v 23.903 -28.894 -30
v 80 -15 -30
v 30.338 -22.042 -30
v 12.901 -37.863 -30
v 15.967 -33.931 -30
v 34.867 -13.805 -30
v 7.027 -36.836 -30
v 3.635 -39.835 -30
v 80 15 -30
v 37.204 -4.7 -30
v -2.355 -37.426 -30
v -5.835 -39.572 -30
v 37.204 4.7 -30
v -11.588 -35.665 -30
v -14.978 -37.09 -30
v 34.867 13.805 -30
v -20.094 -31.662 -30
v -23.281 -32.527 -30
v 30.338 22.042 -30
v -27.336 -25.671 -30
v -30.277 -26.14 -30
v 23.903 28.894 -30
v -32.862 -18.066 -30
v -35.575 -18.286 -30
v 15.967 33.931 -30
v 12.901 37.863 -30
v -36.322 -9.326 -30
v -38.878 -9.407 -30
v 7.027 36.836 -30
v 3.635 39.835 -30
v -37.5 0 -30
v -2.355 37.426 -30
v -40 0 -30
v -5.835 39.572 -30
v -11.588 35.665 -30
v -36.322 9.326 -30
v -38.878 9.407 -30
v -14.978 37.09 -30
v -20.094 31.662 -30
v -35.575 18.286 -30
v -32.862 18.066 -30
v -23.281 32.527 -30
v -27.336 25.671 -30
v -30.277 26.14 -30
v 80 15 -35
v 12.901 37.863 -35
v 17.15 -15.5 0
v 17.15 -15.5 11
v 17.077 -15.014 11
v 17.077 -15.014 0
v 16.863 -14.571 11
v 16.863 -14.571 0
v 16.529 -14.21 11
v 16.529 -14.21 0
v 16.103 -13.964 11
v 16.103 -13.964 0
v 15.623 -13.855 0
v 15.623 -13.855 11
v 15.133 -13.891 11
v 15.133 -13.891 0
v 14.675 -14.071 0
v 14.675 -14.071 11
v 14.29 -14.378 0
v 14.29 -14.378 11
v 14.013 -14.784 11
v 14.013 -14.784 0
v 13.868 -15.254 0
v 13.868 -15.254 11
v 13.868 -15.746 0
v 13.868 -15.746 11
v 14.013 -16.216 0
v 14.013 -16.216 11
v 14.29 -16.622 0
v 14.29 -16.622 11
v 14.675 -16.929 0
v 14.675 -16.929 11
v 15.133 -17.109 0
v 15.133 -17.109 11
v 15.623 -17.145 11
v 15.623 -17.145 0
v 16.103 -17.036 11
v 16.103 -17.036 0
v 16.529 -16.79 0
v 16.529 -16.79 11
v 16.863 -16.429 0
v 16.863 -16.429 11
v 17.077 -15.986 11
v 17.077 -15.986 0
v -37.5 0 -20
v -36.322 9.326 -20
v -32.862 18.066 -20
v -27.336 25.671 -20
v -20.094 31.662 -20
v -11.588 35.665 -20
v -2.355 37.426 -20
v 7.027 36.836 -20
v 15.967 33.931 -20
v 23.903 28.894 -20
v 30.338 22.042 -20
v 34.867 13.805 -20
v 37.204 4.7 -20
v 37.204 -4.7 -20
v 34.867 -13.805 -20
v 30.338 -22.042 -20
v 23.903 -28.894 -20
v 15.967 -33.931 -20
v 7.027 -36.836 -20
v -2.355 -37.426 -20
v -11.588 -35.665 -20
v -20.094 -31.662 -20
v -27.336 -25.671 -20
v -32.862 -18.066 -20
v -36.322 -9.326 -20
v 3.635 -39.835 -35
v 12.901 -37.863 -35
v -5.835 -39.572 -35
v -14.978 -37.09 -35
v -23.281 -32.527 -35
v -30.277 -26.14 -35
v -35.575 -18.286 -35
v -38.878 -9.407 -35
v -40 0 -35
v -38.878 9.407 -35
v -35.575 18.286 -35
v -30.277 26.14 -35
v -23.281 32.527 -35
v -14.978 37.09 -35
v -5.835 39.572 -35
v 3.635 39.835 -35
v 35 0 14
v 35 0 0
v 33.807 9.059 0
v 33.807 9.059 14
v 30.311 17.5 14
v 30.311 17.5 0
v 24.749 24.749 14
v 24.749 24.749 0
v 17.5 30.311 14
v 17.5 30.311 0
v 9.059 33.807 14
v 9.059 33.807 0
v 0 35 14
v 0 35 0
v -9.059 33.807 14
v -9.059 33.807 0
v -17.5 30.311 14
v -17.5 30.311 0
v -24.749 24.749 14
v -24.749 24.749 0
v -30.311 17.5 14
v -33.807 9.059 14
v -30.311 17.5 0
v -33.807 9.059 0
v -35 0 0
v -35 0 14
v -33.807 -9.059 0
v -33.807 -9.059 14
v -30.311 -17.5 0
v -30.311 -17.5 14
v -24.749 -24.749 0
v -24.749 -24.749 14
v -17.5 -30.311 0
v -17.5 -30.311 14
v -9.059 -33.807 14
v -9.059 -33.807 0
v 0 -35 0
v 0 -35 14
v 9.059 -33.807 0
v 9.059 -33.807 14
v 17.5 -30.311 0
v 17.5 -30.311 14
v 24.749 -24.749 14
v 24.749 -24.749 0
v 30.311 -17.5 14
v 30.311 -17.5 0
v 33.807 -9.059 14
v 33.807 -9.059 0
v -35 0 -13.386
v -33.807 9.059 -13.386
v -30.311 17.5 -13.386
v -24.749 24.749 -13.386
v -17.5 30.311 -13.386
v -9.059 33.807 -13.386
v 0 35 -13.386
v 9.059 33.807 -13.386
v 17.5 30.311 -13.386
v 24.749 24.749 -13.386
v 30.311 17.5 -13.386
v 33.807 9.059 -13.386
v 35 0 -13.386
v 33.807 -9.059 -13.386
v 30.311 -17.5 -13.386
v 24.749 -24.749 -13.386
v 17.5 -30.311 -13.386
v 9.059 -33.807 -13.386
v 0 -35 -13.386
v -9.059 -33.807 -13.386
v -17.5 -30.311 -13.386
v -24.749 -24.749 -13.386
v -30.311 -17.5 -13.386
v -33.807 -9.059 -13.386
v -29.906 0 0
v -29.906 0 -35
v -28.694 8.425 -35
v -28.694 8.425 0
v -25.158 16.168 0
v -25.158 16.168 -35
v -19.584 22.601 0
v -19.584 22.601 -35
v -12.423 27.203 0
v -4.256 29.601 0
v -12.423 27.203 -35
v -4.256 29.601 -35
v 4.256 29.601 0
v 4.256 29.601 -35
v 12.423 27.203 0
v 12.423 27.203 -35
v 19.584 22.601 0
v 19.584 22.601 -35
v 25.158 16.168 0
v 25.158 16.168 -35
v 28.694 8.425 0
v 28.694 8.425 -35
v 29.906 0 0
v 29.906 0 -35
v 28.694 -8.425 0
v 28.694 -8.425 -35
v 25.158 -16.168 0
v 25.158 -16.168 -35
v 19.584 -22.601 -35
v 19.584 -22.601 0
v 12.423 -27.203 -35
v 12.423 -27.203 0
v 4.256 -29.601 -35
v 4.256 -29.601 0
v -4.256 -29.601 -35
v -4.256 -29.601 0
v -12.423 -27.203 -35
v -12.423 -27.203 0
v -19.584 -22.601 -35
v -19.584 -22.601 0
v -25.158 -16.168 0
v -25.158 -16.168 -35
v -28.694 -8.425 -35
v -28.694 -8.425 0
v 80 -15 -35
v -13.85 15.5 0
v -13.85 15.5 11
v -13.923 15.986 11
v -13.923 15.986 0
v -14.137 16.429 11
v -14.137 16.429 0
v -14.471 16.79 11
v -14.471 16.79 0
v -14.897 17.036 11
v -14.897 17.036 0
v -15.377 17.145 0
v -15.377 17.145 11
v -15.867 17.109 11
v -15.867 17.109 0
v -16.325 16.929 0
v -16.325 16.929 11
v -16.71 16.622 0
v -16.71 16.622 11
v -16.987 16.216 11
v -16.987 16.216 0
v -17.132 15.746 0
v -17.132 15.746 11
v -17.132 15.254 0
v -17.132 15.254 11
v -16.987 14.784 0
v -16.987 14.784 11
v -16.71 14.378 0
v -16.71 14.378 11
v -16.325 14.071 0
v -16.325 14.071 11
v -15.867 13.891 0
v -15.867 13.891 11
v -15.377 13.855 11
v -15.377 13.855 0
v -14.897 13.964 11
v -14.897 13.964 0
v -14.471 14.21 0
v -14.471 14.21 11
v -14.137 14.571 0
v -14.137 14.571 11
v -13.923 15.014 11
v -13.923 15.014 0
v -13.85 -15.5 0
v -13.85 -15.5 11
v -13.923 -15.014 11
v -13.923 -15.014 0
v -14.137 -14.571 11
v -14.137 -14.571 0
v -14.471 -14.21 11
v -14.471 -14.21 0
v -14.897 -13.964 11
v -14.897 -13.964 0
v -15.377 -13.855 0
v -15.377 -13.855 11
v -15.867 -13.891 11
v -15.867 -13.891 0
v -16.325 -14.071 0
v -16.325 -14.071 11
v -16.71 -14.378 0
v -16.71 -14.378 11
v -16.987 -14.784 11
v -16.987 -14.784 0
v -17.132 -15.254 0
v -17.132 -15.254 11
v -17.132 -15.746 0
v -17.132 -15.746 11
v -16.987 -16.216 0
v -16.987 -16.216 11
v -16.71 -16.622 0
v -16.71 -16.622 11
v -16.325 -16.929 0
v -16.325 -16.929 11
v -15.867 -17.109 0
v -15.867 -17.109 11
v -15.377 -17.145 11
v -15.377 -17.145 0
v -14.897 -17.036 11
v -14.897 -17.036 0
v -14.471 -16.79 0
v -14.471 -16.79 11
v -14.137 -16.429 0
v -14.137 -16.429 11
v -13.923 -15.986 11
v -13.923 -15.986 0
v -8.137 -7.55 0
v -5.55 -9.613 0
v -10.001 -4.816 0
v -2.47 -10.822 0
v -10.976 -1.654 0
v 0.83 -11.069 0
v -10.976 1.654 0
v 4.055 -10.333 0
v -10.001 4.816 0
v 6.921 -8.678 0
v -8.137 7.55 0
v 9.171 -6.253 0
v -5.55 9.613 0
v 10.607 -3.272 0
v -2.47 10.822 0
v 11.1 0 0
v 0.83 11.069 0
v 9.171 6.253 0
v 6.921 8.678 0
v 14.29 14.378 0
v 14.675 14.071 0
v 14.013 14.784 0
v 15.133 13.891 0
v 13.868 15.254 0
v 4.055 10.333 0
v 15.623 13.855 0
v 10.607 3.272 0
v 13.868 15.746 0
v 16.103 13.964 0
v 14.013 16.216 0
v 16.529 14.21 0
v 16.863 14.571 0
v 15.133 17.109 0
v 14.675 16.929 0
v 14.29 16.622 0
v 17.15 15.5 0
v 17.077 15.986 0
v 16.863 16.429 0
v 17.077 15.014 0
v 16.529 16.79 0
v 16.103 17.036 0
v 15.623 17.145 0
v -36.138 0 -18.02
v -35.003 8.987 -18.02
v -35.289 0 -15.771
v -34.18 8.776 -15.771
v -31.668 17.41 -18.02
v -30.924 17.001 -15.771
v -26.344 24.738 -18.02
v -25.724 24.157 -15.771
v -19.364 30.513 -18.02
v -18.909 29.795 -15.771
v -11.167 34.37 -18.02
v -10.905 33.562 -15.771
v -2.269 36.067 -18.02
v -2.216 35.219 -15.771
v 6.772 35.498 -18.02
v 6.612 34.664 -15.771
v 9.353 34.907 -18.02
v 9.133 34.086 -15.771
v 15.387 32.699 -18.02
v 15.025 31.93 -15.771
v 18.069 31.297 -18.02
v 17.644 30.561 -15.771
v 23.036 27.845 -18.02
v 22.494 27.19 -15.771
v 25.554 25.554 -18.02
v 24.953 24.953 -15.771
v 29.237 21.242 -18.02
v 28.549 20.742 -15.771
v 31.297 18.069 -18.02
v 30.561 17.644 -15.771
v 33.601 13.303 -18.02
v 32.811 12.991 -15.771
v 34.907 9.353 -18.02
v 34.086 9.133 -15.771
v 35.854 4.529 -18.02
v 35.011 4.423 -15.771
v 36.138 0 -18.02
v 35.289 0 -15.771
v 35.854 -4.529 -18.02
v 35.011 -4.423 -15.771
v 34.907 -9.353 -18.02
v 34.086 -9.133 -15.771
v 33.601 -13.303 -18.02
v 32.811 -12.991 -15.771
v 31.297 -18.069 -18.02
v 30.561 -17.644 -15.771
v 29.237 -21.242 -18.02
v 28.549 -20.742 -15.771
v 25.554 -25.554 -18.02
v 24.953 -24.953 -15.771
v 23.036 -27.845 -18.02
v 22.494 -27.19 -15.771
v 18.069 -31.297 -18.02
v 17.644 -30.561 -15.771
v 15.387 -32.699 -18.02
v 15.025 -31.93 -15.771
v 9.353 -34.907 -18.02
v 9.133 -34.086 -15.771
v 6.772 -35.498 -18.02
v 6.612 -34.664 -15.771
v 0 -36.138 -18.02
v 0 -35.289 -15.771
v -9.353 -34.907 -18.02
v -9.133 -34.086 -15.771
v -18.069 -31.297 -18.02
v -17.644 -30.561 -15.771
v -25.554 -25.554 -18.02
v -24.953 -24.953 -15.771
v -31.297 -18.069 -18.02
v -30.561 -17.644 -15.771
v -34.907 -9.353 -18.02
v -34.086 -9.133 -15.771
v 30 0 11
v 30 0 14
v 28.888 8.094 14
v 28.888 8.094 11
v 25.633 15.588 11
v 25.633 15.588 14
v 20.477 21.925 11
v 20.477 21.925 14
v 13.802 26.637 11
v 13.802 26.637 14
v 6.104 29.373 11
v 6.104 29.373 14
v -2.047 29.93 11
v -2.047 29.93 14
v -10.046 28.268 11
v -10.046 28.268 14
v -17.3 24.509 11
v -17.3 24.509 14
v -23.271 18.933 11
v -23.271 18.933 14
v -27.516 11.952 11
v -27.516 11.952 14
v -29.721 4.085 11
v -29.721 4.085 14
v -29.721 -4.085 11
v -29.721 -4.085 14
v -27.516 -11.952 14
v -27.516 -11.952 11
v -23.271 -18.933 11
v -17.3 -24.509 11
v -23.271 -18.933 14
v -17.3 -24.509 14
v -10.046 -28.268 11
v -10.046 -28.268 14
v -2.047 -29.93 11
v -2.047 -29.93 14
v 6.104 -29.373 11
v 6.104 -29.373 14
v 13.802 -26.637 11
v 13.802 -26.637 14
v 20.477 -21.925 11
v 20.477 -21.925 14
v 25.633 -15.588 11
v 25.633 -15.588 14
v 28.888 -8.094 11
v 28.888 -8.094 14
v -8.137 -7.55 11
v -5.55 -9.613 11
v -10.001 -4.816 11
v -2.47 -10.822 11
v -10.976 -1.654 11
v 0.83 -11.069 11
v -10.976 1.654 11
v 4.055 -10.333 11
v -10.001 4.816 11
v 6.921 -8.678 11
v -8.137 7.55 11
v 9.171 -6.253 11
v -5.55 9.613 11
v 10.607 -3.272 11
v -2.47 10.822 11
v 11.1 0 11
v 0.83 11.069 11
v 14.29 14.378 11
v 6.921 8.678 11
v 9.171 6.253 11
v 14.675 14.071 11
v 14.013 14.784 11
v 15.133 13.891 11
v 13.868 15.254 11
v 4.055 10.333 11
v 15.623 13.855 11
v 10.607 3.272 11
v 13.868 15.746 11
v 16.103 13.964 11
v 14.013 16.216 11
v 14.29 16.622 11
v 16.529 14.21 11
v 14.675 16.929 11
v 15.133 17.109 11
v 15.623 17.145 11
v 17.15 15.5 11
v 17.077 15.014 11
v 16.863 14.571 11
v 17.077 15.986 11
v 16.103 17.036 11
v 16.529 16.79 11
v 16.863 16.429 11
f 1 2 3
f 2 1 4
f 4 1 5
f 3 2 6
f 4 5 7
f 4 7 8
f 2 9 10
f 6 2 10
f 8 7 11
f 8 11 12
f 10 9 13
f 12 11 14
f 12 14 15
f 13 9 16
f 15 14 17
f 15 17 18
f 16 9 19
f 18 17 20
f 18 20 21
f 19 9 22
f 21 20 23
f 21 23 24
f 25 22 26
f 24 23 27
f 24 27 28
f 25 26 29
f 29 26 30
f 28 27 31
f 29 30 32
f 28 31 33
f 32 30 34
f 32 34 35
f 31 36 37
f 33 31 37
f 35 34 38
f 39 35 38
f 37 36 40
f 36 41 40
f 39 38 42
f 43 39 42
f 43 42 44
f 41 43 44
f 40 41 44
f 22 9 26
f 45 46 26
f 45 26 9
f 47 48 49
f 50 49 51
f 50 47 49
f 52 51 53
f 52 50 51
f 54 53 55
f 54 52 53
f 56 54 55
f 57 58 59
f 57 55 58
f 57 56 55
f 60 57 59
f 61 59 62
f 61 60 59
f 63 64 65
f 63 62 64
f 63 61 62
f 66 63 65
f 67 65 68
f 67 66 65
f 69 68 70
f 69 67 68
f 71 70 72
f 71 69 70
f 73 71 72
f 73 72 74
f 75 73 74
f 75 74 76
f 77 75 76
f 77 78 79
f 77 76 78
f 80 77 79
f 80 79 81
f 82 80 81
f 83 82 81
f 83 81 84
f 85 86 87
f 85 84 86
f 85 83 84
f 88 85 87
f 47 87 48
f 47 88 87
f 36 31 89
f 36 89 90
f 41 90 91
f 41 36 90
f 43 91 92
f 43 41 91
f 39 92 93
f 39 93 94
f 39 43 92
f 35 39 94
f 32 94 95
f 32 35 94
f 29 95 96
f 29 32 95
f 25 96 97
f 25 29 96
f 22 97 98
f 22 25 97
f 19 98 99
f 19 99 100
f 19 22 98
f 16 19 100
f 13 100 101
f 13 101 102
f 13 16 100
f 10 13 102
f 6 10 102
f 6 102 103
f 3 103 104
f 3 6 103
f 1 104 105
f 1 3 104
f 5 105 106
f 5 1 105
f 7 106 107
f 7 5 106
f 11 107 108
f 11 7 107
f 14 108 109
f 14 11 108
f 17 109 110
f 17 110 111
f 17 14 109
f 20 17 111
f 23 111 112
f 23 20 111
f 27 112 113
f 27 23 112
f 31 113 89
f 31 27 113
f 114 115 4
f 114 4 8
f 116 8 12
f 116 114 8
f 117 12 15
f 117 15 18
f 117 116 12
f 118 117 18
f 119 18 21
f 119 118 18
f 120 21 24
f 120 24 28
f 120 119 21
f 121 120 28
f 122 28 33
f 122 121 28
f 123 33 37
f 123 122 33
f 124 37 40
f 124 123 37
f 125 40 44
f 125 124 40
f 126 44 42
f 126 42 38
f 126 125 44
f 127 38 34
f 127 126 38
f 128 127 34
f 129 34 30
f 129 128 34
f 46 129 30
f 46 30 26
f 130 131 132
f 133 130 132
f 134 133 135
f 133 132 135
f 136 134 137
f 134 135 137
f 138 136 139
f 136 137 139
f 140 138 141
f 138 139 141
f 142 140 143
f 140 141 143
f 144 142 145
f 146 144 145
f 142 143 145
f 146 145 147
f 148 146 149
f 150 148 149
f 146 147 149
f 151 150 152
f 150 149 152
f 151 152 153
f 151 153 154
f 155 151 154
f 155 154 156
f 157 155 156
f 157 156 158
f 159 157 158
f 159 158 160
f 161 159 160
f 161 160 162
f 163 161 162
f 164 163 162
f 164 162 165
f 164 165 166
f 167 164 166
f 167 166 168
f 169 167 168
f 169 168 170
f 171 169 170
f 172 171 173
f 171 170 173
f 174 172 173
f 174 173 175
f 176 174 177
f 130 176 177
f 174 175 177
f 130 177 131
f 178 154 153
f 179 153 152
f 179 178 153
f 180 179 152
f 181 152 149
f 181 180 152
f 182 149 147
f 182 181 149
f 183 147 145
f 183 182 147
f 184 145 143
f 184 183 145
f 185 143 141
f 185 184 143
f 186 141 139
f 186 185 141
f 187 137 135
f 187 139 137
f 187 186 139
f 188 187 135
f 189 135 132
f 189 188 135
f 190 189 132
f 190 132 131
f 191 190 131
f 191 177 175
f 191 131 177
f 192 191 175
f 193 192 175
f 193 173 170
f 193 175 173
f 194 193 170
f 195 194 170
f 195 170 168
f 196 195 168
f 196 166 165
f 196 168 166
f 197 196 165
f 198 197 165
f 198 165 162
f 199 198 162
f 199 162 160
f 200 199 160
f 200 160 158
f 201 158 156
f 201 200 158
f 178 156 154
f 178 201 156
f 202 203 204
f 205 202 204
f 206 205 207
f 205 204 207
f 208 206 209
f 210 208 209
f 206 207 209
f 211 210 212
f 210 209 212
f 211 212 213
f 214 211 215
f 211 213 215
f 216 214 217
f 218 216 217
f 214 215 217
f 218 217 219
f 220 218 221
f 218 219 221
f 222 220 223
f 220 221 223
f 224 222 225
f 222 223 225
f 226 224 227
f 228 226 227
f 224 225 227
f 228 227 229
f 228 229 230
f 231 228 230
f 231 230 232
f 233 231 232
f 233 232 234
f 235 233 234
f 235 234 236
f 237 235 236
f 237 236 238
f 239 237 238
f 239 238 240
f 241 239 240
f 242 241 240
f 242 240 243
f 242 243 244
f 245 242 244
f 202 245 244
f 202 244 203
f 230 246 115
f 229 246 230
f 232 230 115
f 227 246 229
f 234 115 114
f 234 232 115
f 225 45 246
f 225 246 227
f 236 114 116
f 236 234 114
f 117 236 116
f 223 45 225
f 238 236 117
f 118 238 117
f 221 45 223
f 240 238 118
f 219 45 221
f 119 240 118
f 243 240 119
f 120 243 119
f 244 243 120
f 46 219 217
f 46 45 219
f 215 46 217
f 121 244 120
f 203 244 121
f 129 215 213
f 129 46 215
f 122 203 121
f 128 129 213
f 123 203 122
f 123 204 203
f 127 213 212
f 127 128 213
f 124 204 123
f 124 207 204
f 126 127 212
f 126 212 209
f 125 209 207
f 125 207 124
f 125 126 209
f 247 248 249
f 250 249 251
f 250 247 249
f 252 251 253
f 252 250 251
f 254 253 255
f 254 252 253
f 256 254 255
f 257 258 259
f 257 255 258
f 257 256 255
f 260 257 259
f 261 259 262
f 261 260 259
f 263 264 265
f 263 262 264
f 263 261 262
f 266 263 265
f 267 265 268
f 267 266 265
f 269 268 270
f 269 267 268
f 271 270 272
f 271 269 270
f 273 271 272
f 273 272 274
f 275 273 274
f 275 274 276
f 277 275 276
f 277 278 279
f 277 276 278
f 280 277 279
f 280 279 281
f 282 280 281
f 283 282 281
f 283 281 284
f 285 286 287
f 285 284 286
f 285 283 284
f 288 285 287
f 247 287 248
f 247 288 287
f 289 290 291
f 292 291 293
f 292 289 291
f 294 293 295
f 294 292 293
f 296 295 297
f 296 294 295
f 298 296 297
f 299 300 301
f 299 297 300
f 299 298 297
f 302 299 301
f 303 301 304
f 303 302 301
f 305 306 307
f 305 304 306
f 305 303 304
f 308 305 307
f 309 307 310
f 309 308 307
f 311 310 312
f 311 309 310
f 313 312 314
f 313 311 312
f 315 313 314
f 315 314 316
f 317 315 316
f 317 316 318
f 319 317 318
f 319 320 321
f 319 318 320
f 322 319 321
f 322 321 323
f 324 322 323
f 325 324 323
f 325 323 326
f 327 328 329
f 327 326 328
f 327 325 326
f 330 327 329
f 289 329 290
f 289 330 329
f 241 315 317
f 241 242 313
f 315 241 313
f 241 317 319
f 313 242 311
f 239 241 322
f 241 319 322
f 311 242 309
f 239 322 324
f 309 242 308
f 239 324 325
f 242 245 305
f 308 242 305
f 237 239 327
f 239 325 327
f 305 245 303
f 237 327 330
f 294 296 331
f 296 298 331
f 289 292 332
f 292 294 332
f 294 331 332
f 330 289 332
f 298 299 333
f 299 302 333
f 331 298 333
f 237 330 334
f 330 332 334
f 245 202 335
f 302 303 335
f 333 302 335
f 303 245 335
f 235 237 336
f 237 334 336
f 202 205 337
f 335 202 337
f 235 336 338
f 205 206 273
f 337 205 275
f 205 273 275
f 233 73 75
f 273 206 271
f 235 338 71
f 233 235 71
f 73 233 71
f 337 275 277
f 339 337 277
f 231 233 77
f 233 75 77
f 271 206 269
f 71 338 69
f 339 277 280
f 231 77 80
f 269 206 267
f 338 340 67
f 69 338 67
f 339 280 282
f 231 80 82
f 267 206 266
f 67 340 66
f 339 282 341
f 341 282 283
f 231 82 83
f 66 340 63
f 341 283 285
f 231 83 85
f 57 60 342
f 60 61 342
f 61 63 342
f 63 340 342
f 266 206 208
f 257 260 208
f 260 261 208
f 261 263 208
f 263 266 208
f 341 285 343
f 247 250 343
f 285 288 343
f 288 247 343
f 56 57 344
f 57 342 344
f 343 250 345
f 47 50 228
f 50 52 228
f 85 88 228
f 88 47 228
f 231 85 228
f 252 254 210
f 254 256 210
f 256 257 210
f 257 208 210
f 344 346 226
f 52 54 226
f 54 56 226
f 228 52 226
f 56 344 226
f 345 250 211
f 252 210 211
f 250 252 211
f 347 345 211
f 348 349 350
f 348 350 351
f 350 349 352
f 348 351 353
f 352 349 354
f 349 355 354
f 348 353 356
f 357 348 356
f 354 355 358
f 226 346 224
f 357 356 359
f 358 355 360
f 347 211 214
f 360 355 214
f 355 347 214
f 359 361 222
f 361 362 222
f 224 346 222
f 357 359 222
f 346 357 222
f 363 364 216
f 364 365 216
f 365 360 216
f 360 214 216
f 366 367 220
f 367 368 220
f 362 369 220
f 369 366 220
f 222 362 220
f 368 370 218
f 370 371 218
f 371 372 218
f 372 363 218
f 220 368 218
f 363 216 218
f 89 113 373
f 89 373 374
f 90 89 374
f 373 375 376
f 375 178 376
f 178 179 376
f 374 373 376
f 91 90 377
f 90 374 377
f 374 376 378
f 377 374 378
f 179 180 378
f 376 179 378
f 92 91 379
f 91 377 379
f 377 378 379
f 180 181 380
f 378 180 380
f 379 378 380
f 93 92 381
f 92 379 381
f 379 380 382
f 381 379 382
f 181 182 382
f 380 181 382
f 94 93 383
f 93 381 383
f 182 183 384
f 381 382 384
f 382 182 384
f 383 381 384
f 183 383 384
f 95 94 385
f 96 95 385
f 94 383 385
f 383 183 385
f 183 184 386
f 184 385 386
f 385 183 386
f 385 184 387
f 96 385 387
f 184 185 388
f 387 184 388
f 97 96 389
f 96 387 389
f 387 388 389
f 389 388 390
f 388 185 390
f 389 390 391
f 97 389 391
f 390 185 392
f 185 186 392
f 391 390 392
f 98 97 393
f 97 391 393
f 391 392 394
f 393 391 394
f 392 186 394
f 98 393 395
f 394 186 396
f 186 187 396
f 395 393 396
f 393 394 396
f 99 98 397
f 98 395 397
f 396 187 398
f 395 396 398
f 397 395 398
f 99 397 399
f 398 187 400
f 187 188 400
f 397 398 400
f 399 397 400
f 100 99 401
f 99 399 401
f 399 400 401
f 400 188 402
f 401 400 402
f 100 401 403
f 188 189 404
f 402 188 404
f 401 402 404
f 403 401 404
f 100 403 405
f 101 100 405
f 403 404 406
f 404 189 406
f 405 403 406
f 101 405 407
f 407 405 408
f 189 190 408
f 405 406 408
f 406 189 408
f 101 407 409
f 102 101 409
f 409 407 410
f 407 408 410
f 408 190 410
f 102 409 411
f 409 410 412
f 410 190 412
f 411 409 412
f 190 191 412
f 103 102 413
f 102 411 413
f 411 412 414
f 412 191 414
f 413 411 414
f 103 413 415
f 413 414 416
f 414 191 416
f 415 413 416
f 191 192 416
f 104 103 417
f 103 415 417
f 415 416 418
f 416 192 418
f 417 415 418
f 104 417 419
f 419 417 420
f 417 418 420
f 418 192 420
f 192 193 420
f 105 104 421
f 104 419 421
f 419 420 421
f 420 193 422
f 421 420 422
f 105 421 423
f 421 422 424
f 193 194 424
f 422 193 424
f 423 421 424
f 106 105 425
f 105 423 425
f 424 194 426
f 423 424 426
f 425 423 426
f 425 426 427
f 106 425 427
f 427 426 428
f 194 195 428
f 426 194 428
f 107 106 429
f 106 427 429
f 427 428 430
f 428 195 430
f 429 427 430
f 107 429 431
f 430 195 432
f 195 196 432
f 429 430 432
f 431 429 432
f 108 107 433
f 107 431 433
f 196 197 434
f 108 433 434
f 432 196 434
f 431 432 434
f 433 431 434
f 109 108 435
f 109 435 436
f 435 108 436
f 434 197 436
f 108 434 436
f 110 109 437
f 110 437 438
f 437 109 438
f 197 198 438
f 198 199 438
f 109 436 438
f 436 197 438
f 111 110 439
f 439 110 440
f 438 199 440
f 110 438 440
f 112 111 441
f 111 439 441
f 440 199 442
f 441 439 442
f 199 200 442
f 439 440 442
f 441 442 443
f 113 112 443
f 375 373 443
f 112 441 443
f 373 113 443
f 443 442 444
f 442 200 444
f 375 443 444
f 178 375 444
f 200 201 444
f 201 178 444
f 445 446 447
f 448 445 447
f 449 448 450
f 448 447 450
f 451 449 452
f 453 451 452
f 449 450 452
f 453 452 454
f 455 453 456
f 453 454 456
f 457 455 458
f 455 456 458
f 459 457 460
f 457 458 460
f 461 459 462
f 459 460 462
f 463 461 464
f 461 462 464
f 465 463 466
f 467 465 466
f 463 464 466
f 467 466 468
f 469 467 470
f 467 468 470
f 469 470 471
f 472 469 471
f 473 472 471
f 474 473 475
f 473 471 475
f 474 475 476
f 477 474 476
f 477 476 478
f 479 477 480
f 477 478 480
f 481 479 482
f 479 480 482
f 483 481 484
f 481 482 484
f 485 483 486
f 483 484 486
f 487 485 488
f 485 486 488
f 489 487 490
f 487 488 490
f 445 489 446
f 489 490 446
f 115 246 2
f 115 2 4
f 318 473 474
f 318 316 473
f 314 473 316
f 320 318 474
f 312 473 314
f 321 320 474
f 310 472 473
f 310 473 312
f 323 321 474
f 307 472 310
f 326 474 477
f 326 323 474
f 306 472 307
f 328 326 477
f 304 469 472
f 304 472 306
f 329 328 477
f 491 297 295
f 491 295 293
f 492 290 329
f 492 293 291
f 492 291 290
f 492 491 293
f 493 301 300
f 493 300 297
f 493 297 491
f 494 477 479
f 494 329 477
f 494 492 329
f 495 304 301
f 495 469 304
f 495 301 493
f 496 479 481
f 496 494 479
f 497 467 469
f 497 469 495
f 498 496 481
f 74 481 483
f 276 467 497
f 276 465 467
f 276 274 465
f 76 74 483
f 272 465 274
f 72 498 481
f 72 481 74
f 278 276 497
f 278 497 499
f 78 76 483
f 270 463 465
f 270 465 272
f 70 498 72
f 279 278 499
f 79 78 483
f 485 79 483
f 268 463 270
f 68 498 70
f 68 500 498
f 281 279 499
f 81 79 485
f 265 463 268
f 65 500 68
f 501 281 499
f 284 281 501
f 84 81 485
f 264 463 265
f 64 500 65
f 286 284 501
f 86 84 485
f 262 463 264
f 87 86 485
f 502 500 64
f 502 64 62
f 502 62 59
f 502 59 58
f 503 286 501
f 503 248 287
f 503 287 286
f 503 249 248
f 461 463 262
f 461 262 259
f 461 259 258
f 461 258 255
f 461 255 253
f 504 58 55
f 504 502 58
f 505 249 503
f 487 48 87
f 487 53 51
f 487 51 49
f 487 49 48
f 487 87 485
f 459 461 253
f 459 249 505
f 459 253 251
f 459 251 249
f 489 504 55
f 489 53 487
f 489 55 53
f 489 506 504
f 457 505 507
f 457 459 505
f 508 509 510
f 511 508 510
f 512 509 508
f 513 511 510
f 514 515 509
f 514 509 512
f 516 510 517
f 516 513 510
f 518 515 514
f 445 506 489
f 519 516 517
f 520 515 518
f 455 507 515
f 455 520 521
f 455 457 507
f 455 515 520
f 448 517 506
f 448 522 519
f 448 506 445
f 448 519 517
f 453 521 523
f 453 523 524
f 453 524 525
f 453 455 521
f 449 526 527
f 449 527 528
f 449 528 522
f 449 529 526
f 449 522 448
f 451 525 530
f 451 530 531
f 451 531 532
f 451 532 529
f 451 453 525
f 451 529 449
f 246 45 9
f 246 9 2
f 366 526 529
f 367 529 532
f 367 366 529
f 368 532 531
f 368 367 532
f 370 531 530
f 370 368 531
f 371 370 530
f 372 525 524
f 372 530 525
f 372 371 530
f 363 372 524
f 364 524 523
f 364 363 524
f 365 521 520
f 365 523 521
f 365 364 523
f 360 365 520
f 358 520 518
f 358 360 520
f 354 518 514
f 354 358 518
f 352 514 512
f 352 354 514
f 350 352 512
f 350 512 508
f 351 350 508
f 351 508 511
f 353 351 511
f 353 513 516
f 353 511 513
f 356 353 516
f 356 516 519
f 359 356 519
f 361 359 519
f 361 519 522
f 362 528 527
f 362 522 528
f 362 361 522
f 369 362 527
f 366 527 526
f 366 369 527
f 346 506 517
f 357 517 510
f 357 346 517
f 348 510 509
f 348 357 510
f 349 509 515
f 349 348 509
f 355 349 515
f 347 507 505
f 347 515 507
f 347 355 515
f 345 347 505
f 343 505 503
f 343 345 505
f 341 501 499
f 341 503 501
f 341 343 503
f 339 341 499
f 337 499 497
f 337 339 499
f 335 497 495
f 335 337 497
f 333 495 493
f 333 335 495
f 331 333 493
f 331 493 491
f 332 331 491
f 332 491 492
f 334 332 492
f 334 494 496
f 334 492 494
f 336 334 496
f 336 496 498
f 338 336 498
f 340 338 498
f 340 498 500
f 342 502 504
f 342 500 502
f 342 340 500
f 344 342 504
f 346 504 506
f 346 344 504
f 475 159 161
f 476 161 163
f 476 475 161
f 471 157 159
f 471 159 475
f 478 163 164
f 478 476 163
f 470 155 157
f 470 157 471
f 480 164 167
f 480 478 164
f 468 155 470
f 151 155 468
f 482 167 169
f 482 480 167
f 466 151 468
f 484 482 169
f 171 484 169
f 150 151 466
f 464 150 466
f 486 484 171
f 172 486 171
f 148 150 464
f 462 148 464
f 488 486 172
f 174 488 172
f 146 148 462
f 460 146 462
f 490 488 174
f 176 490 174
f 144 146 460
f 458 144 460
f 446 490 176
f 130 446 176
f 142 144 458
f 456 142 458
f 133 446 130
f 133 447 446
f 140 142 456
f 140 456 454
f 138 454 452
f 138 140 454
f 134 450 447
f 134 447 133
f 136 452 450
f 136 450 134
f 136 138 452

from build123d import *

# Parameters (mm, degrees)
ESQUISSE1_R             = 35
ESQUISSE1_R_2           = 11.1
ESQUISSE1_R_3           = 1.65
BOSS_EXTRU_1_DEPTH      = 14
BOSS_EXTRU_5_START      = 20
ESQUISSE2_R             = 35
ESQUISSE2_R_2           = 29.905514519
BOSS_EXTRU_5_DEPTH      = 20
BOSS_EXTRU_6_START      = 10
ESQUISSE5_R             = 37.5
ESQUISSE5_R_2           = 29.905514519
BOSS_EXTRU_6_DEPTH      = 10
CONG_1_R                = 10
BOSS_EXTRU_7_START      = 5
ESQUISSE6_R             = 29.905514519
BOSS_EXTRU_7_DEPTH      = 5
ESQUISSE7_R             = 30
ENL_V_MAT_EXTRU_1_DEPTH = 3


with BuildPart() as part:
    # Esquisse1 → Boss.-Extru.1 (new body)
    with BuildSketch(Plane.XY):
        Circle(ESQUISSE1_R)
        Circle(ESQUISSE1_R_2, mode=Mode.SUBTRACT)
        with Locations((-15.5, 15.5)):
            Circle(ESQUISSE1_R_3, mode=Mode.SUBTRACT)
        with Locations((15.5, 15.5)):
            Circle(ESQUISSE1_R_3, mode=Mode.SUBTRACT)
        with Locations((15.5, -15.5)):
            Circle(ESQUISSE1_R_3, mode=Mode.SUBTRACT)
        with Locations((-15.5, -15.5)):
            Circle(ESQUISSE1_R_3, mode=Mode.SUBTRACT)
    extrude(amount=BOSS_EXTRU_1_DEPTH)

    # Esquisse2 → Boss.-Extru.5 (add)
    with BuildSketch(Plane(origin=(0, 0, 0), x_dir=(-1, 0, 0), z_dir=(0, 0, -1)).offset(BOSS_EXTRU_5_START)):
        Circle(ESQUISSE2_R)
        Circle(ESQUISSE2_R_2, mode=Mode.SUBTRACT)
    extrude(amount=-BOSS_EXTRU_5_DEPTH)

    # Esquisse5 → Boss.-Extru.6 (add)
    with BuildSketch(Plane(origin=(0, 0, -20), x_dir=(-1, 0, 0), z_dir=(0, 0, -1)).offset(BOSS_EXTRU_6_START)):
        Circle(ESQUISSE5_R)
        Circle(ESQUISSE5_R_2, mode=Mode.SUBTRACT)
    extrude(amount=-BOSS_EXTRU_6_DEPTH)

    # Congé1
    # the kernel refuses this fillet: 10 mm, written as the material it adds along each edge
    with BuildSketch(Plane(origin=(0, 0, -20), x_dir=(-1, 0, 0), z_dir=(0, -1, 0))) as cong_1_piece_1:
        with BuildLine():
            CenterArc((45, -6.614378278), CONG_1_R, 138.590377891, 41.409622109)
            Line((37.5, 0), (37.35, 0.132287566))
            ThreePointArc((37.35, 0.132287566), (36.25, 0.2), (35, 0.2))
            Line((35, 0.2), (34.8, 0))
            Line((34.8, 0), (34.8, -6.614378278))
            Line((34.8, -6.614378278), (35, -6.614378278))
        make_face()
    revolve(axis=Axis((0, 0, -20), (0, 0, -1)))

    # Esquisse6 → Boss.-Extru.7 (add)
    with BuildSketch(Plane(origin=(0, 0, -30), x_dir=(-1, 0, 0), z_dir=(0, 0, -1)).offset(BOSS_EXTRU_7_START)):
        with BuildLine():
            Line((-12.900778772, 37.862513217), (-80, 15))
            Line((-80, 15), (-80, -15))
            Line((-80, -15), (-12.900778772, -37.862513217))
            ThreePointArc((-12.900778772, -37.862513217), (40, 0), (-12.900778772, 37.862513217))
        make_face()
        Circle(ESQUISSE6_R, mode=Mode.SUBTRACT)
    extrude(amount=-BOSS_EXTRU_7_DEPTH)

    # Esquisse7 → Enlèv. mat.-Extru.1 (cut)
    with BuildSketch(Plane.XY.offset(14)):
        Circle(ESQUISSE7_R)
    extrude(amount=-ENL_V_MAT_EXTRU_1_DEPTH, mode=Mode.SUBTRACT)


solid = part.part
